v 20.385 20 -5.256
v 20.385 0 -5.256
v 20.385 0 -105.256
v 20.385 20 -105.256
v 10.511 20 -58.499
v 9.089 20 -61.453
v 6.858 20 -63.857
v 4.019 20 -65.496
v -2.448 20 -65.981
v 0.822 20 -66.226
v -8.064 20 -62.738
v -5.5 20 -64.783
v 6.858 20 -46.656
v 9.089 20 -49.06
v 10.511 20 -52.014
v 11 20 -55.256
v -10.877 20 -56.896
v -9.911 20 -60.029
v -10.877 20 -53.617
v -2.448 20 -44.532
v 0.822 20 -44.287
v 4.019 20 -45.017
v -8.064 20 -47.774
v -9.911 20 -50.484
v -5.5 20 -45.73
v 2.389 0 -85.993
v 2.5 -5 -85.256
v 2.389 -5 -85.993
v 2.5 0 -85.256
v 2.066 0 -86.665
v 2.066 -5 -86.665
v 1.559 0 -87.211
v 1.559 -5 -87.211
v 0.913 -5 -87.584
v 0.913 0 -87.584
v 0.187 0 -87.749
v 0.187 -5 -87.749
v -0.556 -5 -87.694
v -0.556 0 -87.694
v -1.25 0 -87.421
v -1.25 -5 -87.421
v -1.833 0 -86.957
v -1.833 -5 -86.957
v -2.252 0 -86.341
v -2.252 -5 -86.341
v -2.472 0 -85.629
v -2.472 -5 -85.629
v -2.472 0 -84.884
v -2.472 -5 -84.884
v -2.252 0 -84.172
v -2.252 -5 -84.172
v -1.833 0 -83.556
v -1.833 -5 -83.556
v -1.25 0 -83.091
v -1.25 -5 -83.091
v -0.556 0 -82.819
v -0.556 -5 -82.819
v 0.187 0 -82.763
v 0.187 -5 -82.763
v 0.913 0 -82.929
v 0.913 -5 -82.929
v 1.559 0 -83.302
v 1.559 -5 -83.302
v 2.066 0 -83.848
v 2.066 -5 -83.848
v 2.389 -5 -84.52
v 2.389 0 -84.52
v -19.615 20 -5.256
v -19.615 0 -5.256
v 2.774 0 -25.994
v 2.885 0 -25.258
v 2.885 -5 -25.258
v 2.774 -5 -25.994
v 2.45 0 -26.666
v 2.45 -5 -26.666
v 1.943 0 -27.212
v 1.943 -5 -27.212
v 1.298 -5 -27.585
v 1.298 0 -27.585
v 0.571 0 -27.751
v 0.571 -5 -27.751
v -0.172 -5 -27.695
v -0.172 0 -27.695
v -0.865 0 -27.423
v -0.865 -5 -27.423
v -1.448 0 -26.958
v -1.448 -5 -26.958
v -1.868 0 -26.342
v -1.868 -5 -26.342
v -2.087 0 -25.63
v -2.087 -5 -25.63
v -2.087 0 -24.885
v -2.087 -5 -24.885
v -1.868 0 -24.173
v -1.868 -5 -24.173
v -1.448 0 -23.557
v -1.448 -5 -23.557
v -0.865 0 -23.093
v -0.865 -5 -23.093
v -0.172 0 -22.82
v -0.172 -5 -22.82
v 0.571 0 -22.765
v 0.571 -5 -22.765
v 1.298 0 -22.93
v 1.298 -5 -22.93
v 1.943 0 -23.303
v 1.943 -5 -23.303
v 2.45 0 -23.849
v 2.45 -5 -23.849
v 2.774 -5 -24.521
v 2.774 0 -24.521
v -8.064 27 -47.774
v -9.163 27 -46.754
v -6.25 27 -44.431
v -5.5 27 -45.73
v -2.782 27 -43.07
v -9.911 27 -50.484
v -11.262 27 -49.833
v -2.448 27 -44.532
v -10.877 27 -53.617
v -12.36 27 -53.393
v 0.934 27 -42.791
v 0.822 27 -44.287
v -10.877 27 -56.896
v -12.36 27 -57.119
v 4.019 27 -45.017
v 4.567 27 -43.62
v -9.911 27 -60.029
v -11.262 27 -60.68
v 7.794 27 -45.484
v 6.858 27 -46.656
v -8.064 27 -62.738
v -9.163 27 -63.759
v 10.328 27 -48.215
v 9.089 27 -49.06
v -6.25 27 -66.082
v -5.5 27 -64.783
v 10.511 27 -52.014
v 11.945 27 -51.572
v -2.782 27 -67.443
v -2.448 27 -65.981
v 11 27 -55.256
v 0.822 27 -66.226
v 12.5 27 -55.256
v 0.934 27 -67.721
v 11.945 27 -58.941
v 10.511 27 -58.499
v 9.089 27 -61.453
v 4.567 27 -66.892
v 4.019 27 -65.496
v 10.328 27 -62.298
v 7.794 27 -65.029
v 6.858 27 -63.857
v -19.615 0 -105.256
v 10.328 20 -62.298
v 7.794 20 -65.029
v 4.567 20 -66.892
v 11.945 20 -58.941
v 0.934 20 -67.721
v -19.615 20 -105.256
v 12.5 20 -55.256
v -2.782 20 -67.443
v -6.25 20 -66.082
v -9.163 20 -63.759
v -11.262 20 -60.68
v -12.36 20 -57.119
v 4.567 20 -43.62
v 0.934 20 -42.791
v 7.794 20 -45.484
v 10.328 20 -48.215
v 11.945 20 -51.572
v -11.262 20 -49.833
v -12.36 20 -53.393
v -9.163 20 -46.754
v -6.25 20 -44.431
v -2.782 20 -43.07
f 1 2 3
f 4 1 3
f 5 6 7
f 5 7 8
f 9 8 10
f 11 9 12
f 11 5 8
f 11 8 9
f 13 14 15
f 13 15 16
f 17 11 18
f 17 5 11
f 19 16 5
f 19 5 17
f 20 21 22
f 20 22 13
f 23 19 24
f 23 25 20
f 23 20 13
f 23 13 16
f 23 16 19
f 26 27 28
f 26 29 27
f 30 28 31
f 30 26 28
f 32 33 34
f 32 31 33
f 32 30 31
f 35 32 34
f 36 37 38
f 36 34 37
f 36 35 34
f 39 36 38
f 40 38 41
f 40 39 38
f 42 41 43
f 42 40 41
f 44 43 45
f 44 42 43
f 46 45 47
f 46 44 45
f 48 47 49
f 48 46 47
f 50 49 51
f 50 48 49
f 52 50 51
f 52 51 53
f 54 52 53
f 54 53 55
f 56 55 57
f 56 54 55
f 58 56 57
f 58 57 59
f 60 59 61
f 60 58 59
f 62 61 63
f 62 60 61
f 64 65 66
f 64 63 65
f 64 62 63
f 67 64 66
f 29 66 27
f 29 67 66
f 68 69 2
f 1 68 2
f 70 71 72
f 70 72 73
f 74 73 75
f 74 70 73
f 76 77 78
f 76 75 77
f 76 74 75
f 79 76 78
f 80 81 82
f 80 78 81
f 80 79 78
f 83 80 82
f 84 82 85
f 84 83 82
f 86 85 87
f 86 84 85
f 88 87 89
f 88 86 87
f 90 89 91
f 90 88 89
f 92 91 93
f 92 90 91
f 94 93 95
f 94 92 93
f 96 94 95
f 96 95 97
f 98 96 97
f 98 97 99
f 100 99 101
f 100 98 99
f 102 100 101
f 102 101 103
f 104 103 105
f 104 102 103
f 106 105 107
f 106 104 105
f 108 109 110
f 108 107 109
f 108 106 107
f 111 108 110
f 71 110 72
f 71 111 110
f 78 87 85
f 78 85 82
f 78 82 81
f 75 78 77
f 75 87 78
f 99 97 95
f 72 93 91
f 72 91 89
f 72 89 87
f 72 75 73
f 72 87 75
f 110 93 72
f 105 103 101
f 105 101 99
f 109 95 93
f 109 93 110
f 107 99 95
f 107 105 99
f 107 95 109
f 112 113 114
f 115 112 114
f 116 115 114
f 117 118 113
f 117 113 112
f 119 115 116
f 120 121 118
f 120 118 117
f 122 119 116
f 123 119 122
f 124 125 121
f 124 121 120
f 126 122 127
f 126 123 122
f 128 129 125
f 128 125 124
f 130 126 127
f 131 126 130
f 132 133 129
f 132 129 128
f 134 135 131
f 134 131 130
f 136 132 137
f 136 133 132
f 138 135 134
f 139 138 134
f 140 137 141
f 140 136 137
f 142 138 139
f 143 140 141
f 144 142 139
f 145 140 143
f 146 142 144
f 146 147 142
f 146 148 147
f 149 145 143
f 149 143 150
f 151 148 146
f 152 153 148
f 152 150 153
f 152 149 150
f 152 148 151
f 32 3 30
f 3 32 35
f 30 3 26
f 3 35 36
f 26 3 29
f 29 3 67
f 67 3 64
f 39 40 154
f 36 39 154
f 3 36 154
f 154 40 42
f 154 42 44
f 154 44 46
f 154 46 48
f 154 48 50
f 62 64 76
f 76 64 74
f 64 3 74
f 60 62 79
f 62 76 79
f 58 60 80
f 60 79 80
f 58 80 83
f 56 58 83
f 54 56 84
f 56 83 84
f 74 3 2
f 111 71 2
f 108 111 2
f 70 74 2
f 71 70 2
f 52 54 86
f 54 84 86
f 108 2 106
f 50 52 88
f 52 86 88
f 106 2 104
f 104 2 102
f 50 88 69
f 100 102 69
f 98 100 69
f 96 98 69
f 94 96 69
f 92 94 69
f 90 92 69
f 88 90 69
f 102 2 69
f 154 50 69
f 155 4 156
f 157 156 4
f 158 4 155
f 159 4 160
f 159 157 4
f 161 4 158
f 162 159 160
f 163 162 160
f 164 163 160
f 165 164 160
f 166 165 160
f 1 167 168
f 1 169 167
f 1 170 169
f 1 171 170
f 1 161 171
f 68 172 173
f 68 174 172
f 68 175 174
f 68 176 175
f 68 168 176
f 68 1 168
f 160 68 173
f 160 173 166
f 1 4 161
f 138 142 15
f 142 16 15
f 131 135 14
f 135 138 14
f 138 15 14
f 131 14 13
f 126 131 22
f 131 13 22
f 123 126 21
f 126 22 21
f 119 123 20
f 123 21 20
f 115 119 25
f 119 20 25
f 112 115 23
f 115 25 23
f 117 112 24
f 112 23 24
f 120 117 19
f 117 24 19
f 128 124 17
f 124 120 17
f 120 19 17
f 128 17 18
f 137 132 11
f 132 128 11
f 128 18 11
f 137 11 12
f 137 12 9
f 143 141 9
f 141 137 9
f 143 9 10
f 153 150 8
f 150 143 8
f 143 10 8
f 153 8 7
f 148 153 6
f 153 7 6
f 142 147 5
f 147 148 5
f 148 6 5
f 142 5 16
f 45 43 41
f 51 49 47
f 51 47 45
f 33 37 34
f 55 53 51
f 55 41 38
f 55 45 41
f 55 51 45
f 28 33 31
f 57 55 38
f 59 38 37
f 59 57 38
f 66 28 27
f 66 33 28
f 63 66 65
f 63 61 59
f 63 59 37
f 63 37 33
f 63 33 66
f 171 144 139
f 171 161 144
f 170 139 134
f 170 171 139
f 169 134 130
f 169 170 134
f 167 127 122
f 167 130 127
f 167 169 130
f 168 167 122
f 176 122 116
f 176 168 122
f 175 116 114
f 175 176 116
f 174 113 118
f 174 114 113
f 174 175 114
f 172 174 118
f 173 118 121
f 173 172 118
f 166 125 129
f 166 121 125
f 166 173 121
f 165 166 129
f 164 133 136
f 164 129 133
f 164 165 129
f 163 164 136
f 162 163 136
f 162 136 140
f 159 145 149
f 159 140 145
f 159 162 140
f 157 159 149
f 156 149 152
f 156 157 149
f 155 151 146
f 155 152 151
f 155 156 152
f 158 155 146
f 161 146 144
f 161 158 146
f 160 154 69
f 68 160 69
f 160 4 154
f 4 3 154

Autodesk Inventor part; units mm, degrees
ref_plane "YZ Plane" through (0, 0, 0) normal (1, 0, 0) x (0, 1, 0)
ref_plane "XZ Plane" through (0, 0, 0) normal (0, 1, 0) x (-1, 0, 0)
ref_plane "XY Plane" through (0, 0, 0) normal (0, 0, 1) x (1, 0, 0)
sketch "Esboço1" plane through (0, 0, 0) normal (0, 1, 0) x (-1, 0, 0)
  line L0 (19.6154, -5.2564) -> (-20.3846, -5.2564)
  line L1 (-20.3846, -5.2564) -> (-20.3846, -105.2564)
  line L2 (-20.3846, -105.2564) -> (19.6154, -105.2564)
  line L3 (19.6154, -105.2564) -> (19.6154, -5.2564)
  point P0 (0, 0)
  dimension "d0" = 40
  dimension "d4" = 100
extrude "Extrusão1" add sketch "Esboço1" along normal blind 20
sketch "Esboço2" plane through (0, 20, 0) normal (0, 1, 0) x (1, 0, 0)
  circle A0 centre (0, 55.2564) radius 12.5
  circle A1 centre (0, 55.2564) radius 11
  line L0 (20.3846, 105.2564) -> (-19.6154, 105.2564) projected
  point P0 (0, 0)
  dimension "d11" = 22
  dimension "d12" = 25
  dimension "d13" = 50
extrude "Extrusão2" add sketch "Esboço2" along normal blind 7
sketch "Esboço3" plane through (0, 0, 0) normal (0, -1, 0) x (1, 0, 0)
  circle A0 centre (0.3846, -25.2576) radius 2.5
  circle A1 centre (0, -85.2564) radius 2.5
  line L0 (20.3846, -105.2564) -> (-19.6154, -105.2564) projected
  line L1 (20.3846, -5.2564) -> (20.3846, -105.2564) projected
  point P0 (0, 0)
  dimension "d16" = 5
  dimension "d17" = 5
  dimension "d18" = 60
  dimension "d19" = 20
  dimension "d20" = 20
extrude "Extrusão3" add sketch "Esboço3" along normal blind 5
properties part number "Suporte para estrutura_CPY" material "ABS plástico"
